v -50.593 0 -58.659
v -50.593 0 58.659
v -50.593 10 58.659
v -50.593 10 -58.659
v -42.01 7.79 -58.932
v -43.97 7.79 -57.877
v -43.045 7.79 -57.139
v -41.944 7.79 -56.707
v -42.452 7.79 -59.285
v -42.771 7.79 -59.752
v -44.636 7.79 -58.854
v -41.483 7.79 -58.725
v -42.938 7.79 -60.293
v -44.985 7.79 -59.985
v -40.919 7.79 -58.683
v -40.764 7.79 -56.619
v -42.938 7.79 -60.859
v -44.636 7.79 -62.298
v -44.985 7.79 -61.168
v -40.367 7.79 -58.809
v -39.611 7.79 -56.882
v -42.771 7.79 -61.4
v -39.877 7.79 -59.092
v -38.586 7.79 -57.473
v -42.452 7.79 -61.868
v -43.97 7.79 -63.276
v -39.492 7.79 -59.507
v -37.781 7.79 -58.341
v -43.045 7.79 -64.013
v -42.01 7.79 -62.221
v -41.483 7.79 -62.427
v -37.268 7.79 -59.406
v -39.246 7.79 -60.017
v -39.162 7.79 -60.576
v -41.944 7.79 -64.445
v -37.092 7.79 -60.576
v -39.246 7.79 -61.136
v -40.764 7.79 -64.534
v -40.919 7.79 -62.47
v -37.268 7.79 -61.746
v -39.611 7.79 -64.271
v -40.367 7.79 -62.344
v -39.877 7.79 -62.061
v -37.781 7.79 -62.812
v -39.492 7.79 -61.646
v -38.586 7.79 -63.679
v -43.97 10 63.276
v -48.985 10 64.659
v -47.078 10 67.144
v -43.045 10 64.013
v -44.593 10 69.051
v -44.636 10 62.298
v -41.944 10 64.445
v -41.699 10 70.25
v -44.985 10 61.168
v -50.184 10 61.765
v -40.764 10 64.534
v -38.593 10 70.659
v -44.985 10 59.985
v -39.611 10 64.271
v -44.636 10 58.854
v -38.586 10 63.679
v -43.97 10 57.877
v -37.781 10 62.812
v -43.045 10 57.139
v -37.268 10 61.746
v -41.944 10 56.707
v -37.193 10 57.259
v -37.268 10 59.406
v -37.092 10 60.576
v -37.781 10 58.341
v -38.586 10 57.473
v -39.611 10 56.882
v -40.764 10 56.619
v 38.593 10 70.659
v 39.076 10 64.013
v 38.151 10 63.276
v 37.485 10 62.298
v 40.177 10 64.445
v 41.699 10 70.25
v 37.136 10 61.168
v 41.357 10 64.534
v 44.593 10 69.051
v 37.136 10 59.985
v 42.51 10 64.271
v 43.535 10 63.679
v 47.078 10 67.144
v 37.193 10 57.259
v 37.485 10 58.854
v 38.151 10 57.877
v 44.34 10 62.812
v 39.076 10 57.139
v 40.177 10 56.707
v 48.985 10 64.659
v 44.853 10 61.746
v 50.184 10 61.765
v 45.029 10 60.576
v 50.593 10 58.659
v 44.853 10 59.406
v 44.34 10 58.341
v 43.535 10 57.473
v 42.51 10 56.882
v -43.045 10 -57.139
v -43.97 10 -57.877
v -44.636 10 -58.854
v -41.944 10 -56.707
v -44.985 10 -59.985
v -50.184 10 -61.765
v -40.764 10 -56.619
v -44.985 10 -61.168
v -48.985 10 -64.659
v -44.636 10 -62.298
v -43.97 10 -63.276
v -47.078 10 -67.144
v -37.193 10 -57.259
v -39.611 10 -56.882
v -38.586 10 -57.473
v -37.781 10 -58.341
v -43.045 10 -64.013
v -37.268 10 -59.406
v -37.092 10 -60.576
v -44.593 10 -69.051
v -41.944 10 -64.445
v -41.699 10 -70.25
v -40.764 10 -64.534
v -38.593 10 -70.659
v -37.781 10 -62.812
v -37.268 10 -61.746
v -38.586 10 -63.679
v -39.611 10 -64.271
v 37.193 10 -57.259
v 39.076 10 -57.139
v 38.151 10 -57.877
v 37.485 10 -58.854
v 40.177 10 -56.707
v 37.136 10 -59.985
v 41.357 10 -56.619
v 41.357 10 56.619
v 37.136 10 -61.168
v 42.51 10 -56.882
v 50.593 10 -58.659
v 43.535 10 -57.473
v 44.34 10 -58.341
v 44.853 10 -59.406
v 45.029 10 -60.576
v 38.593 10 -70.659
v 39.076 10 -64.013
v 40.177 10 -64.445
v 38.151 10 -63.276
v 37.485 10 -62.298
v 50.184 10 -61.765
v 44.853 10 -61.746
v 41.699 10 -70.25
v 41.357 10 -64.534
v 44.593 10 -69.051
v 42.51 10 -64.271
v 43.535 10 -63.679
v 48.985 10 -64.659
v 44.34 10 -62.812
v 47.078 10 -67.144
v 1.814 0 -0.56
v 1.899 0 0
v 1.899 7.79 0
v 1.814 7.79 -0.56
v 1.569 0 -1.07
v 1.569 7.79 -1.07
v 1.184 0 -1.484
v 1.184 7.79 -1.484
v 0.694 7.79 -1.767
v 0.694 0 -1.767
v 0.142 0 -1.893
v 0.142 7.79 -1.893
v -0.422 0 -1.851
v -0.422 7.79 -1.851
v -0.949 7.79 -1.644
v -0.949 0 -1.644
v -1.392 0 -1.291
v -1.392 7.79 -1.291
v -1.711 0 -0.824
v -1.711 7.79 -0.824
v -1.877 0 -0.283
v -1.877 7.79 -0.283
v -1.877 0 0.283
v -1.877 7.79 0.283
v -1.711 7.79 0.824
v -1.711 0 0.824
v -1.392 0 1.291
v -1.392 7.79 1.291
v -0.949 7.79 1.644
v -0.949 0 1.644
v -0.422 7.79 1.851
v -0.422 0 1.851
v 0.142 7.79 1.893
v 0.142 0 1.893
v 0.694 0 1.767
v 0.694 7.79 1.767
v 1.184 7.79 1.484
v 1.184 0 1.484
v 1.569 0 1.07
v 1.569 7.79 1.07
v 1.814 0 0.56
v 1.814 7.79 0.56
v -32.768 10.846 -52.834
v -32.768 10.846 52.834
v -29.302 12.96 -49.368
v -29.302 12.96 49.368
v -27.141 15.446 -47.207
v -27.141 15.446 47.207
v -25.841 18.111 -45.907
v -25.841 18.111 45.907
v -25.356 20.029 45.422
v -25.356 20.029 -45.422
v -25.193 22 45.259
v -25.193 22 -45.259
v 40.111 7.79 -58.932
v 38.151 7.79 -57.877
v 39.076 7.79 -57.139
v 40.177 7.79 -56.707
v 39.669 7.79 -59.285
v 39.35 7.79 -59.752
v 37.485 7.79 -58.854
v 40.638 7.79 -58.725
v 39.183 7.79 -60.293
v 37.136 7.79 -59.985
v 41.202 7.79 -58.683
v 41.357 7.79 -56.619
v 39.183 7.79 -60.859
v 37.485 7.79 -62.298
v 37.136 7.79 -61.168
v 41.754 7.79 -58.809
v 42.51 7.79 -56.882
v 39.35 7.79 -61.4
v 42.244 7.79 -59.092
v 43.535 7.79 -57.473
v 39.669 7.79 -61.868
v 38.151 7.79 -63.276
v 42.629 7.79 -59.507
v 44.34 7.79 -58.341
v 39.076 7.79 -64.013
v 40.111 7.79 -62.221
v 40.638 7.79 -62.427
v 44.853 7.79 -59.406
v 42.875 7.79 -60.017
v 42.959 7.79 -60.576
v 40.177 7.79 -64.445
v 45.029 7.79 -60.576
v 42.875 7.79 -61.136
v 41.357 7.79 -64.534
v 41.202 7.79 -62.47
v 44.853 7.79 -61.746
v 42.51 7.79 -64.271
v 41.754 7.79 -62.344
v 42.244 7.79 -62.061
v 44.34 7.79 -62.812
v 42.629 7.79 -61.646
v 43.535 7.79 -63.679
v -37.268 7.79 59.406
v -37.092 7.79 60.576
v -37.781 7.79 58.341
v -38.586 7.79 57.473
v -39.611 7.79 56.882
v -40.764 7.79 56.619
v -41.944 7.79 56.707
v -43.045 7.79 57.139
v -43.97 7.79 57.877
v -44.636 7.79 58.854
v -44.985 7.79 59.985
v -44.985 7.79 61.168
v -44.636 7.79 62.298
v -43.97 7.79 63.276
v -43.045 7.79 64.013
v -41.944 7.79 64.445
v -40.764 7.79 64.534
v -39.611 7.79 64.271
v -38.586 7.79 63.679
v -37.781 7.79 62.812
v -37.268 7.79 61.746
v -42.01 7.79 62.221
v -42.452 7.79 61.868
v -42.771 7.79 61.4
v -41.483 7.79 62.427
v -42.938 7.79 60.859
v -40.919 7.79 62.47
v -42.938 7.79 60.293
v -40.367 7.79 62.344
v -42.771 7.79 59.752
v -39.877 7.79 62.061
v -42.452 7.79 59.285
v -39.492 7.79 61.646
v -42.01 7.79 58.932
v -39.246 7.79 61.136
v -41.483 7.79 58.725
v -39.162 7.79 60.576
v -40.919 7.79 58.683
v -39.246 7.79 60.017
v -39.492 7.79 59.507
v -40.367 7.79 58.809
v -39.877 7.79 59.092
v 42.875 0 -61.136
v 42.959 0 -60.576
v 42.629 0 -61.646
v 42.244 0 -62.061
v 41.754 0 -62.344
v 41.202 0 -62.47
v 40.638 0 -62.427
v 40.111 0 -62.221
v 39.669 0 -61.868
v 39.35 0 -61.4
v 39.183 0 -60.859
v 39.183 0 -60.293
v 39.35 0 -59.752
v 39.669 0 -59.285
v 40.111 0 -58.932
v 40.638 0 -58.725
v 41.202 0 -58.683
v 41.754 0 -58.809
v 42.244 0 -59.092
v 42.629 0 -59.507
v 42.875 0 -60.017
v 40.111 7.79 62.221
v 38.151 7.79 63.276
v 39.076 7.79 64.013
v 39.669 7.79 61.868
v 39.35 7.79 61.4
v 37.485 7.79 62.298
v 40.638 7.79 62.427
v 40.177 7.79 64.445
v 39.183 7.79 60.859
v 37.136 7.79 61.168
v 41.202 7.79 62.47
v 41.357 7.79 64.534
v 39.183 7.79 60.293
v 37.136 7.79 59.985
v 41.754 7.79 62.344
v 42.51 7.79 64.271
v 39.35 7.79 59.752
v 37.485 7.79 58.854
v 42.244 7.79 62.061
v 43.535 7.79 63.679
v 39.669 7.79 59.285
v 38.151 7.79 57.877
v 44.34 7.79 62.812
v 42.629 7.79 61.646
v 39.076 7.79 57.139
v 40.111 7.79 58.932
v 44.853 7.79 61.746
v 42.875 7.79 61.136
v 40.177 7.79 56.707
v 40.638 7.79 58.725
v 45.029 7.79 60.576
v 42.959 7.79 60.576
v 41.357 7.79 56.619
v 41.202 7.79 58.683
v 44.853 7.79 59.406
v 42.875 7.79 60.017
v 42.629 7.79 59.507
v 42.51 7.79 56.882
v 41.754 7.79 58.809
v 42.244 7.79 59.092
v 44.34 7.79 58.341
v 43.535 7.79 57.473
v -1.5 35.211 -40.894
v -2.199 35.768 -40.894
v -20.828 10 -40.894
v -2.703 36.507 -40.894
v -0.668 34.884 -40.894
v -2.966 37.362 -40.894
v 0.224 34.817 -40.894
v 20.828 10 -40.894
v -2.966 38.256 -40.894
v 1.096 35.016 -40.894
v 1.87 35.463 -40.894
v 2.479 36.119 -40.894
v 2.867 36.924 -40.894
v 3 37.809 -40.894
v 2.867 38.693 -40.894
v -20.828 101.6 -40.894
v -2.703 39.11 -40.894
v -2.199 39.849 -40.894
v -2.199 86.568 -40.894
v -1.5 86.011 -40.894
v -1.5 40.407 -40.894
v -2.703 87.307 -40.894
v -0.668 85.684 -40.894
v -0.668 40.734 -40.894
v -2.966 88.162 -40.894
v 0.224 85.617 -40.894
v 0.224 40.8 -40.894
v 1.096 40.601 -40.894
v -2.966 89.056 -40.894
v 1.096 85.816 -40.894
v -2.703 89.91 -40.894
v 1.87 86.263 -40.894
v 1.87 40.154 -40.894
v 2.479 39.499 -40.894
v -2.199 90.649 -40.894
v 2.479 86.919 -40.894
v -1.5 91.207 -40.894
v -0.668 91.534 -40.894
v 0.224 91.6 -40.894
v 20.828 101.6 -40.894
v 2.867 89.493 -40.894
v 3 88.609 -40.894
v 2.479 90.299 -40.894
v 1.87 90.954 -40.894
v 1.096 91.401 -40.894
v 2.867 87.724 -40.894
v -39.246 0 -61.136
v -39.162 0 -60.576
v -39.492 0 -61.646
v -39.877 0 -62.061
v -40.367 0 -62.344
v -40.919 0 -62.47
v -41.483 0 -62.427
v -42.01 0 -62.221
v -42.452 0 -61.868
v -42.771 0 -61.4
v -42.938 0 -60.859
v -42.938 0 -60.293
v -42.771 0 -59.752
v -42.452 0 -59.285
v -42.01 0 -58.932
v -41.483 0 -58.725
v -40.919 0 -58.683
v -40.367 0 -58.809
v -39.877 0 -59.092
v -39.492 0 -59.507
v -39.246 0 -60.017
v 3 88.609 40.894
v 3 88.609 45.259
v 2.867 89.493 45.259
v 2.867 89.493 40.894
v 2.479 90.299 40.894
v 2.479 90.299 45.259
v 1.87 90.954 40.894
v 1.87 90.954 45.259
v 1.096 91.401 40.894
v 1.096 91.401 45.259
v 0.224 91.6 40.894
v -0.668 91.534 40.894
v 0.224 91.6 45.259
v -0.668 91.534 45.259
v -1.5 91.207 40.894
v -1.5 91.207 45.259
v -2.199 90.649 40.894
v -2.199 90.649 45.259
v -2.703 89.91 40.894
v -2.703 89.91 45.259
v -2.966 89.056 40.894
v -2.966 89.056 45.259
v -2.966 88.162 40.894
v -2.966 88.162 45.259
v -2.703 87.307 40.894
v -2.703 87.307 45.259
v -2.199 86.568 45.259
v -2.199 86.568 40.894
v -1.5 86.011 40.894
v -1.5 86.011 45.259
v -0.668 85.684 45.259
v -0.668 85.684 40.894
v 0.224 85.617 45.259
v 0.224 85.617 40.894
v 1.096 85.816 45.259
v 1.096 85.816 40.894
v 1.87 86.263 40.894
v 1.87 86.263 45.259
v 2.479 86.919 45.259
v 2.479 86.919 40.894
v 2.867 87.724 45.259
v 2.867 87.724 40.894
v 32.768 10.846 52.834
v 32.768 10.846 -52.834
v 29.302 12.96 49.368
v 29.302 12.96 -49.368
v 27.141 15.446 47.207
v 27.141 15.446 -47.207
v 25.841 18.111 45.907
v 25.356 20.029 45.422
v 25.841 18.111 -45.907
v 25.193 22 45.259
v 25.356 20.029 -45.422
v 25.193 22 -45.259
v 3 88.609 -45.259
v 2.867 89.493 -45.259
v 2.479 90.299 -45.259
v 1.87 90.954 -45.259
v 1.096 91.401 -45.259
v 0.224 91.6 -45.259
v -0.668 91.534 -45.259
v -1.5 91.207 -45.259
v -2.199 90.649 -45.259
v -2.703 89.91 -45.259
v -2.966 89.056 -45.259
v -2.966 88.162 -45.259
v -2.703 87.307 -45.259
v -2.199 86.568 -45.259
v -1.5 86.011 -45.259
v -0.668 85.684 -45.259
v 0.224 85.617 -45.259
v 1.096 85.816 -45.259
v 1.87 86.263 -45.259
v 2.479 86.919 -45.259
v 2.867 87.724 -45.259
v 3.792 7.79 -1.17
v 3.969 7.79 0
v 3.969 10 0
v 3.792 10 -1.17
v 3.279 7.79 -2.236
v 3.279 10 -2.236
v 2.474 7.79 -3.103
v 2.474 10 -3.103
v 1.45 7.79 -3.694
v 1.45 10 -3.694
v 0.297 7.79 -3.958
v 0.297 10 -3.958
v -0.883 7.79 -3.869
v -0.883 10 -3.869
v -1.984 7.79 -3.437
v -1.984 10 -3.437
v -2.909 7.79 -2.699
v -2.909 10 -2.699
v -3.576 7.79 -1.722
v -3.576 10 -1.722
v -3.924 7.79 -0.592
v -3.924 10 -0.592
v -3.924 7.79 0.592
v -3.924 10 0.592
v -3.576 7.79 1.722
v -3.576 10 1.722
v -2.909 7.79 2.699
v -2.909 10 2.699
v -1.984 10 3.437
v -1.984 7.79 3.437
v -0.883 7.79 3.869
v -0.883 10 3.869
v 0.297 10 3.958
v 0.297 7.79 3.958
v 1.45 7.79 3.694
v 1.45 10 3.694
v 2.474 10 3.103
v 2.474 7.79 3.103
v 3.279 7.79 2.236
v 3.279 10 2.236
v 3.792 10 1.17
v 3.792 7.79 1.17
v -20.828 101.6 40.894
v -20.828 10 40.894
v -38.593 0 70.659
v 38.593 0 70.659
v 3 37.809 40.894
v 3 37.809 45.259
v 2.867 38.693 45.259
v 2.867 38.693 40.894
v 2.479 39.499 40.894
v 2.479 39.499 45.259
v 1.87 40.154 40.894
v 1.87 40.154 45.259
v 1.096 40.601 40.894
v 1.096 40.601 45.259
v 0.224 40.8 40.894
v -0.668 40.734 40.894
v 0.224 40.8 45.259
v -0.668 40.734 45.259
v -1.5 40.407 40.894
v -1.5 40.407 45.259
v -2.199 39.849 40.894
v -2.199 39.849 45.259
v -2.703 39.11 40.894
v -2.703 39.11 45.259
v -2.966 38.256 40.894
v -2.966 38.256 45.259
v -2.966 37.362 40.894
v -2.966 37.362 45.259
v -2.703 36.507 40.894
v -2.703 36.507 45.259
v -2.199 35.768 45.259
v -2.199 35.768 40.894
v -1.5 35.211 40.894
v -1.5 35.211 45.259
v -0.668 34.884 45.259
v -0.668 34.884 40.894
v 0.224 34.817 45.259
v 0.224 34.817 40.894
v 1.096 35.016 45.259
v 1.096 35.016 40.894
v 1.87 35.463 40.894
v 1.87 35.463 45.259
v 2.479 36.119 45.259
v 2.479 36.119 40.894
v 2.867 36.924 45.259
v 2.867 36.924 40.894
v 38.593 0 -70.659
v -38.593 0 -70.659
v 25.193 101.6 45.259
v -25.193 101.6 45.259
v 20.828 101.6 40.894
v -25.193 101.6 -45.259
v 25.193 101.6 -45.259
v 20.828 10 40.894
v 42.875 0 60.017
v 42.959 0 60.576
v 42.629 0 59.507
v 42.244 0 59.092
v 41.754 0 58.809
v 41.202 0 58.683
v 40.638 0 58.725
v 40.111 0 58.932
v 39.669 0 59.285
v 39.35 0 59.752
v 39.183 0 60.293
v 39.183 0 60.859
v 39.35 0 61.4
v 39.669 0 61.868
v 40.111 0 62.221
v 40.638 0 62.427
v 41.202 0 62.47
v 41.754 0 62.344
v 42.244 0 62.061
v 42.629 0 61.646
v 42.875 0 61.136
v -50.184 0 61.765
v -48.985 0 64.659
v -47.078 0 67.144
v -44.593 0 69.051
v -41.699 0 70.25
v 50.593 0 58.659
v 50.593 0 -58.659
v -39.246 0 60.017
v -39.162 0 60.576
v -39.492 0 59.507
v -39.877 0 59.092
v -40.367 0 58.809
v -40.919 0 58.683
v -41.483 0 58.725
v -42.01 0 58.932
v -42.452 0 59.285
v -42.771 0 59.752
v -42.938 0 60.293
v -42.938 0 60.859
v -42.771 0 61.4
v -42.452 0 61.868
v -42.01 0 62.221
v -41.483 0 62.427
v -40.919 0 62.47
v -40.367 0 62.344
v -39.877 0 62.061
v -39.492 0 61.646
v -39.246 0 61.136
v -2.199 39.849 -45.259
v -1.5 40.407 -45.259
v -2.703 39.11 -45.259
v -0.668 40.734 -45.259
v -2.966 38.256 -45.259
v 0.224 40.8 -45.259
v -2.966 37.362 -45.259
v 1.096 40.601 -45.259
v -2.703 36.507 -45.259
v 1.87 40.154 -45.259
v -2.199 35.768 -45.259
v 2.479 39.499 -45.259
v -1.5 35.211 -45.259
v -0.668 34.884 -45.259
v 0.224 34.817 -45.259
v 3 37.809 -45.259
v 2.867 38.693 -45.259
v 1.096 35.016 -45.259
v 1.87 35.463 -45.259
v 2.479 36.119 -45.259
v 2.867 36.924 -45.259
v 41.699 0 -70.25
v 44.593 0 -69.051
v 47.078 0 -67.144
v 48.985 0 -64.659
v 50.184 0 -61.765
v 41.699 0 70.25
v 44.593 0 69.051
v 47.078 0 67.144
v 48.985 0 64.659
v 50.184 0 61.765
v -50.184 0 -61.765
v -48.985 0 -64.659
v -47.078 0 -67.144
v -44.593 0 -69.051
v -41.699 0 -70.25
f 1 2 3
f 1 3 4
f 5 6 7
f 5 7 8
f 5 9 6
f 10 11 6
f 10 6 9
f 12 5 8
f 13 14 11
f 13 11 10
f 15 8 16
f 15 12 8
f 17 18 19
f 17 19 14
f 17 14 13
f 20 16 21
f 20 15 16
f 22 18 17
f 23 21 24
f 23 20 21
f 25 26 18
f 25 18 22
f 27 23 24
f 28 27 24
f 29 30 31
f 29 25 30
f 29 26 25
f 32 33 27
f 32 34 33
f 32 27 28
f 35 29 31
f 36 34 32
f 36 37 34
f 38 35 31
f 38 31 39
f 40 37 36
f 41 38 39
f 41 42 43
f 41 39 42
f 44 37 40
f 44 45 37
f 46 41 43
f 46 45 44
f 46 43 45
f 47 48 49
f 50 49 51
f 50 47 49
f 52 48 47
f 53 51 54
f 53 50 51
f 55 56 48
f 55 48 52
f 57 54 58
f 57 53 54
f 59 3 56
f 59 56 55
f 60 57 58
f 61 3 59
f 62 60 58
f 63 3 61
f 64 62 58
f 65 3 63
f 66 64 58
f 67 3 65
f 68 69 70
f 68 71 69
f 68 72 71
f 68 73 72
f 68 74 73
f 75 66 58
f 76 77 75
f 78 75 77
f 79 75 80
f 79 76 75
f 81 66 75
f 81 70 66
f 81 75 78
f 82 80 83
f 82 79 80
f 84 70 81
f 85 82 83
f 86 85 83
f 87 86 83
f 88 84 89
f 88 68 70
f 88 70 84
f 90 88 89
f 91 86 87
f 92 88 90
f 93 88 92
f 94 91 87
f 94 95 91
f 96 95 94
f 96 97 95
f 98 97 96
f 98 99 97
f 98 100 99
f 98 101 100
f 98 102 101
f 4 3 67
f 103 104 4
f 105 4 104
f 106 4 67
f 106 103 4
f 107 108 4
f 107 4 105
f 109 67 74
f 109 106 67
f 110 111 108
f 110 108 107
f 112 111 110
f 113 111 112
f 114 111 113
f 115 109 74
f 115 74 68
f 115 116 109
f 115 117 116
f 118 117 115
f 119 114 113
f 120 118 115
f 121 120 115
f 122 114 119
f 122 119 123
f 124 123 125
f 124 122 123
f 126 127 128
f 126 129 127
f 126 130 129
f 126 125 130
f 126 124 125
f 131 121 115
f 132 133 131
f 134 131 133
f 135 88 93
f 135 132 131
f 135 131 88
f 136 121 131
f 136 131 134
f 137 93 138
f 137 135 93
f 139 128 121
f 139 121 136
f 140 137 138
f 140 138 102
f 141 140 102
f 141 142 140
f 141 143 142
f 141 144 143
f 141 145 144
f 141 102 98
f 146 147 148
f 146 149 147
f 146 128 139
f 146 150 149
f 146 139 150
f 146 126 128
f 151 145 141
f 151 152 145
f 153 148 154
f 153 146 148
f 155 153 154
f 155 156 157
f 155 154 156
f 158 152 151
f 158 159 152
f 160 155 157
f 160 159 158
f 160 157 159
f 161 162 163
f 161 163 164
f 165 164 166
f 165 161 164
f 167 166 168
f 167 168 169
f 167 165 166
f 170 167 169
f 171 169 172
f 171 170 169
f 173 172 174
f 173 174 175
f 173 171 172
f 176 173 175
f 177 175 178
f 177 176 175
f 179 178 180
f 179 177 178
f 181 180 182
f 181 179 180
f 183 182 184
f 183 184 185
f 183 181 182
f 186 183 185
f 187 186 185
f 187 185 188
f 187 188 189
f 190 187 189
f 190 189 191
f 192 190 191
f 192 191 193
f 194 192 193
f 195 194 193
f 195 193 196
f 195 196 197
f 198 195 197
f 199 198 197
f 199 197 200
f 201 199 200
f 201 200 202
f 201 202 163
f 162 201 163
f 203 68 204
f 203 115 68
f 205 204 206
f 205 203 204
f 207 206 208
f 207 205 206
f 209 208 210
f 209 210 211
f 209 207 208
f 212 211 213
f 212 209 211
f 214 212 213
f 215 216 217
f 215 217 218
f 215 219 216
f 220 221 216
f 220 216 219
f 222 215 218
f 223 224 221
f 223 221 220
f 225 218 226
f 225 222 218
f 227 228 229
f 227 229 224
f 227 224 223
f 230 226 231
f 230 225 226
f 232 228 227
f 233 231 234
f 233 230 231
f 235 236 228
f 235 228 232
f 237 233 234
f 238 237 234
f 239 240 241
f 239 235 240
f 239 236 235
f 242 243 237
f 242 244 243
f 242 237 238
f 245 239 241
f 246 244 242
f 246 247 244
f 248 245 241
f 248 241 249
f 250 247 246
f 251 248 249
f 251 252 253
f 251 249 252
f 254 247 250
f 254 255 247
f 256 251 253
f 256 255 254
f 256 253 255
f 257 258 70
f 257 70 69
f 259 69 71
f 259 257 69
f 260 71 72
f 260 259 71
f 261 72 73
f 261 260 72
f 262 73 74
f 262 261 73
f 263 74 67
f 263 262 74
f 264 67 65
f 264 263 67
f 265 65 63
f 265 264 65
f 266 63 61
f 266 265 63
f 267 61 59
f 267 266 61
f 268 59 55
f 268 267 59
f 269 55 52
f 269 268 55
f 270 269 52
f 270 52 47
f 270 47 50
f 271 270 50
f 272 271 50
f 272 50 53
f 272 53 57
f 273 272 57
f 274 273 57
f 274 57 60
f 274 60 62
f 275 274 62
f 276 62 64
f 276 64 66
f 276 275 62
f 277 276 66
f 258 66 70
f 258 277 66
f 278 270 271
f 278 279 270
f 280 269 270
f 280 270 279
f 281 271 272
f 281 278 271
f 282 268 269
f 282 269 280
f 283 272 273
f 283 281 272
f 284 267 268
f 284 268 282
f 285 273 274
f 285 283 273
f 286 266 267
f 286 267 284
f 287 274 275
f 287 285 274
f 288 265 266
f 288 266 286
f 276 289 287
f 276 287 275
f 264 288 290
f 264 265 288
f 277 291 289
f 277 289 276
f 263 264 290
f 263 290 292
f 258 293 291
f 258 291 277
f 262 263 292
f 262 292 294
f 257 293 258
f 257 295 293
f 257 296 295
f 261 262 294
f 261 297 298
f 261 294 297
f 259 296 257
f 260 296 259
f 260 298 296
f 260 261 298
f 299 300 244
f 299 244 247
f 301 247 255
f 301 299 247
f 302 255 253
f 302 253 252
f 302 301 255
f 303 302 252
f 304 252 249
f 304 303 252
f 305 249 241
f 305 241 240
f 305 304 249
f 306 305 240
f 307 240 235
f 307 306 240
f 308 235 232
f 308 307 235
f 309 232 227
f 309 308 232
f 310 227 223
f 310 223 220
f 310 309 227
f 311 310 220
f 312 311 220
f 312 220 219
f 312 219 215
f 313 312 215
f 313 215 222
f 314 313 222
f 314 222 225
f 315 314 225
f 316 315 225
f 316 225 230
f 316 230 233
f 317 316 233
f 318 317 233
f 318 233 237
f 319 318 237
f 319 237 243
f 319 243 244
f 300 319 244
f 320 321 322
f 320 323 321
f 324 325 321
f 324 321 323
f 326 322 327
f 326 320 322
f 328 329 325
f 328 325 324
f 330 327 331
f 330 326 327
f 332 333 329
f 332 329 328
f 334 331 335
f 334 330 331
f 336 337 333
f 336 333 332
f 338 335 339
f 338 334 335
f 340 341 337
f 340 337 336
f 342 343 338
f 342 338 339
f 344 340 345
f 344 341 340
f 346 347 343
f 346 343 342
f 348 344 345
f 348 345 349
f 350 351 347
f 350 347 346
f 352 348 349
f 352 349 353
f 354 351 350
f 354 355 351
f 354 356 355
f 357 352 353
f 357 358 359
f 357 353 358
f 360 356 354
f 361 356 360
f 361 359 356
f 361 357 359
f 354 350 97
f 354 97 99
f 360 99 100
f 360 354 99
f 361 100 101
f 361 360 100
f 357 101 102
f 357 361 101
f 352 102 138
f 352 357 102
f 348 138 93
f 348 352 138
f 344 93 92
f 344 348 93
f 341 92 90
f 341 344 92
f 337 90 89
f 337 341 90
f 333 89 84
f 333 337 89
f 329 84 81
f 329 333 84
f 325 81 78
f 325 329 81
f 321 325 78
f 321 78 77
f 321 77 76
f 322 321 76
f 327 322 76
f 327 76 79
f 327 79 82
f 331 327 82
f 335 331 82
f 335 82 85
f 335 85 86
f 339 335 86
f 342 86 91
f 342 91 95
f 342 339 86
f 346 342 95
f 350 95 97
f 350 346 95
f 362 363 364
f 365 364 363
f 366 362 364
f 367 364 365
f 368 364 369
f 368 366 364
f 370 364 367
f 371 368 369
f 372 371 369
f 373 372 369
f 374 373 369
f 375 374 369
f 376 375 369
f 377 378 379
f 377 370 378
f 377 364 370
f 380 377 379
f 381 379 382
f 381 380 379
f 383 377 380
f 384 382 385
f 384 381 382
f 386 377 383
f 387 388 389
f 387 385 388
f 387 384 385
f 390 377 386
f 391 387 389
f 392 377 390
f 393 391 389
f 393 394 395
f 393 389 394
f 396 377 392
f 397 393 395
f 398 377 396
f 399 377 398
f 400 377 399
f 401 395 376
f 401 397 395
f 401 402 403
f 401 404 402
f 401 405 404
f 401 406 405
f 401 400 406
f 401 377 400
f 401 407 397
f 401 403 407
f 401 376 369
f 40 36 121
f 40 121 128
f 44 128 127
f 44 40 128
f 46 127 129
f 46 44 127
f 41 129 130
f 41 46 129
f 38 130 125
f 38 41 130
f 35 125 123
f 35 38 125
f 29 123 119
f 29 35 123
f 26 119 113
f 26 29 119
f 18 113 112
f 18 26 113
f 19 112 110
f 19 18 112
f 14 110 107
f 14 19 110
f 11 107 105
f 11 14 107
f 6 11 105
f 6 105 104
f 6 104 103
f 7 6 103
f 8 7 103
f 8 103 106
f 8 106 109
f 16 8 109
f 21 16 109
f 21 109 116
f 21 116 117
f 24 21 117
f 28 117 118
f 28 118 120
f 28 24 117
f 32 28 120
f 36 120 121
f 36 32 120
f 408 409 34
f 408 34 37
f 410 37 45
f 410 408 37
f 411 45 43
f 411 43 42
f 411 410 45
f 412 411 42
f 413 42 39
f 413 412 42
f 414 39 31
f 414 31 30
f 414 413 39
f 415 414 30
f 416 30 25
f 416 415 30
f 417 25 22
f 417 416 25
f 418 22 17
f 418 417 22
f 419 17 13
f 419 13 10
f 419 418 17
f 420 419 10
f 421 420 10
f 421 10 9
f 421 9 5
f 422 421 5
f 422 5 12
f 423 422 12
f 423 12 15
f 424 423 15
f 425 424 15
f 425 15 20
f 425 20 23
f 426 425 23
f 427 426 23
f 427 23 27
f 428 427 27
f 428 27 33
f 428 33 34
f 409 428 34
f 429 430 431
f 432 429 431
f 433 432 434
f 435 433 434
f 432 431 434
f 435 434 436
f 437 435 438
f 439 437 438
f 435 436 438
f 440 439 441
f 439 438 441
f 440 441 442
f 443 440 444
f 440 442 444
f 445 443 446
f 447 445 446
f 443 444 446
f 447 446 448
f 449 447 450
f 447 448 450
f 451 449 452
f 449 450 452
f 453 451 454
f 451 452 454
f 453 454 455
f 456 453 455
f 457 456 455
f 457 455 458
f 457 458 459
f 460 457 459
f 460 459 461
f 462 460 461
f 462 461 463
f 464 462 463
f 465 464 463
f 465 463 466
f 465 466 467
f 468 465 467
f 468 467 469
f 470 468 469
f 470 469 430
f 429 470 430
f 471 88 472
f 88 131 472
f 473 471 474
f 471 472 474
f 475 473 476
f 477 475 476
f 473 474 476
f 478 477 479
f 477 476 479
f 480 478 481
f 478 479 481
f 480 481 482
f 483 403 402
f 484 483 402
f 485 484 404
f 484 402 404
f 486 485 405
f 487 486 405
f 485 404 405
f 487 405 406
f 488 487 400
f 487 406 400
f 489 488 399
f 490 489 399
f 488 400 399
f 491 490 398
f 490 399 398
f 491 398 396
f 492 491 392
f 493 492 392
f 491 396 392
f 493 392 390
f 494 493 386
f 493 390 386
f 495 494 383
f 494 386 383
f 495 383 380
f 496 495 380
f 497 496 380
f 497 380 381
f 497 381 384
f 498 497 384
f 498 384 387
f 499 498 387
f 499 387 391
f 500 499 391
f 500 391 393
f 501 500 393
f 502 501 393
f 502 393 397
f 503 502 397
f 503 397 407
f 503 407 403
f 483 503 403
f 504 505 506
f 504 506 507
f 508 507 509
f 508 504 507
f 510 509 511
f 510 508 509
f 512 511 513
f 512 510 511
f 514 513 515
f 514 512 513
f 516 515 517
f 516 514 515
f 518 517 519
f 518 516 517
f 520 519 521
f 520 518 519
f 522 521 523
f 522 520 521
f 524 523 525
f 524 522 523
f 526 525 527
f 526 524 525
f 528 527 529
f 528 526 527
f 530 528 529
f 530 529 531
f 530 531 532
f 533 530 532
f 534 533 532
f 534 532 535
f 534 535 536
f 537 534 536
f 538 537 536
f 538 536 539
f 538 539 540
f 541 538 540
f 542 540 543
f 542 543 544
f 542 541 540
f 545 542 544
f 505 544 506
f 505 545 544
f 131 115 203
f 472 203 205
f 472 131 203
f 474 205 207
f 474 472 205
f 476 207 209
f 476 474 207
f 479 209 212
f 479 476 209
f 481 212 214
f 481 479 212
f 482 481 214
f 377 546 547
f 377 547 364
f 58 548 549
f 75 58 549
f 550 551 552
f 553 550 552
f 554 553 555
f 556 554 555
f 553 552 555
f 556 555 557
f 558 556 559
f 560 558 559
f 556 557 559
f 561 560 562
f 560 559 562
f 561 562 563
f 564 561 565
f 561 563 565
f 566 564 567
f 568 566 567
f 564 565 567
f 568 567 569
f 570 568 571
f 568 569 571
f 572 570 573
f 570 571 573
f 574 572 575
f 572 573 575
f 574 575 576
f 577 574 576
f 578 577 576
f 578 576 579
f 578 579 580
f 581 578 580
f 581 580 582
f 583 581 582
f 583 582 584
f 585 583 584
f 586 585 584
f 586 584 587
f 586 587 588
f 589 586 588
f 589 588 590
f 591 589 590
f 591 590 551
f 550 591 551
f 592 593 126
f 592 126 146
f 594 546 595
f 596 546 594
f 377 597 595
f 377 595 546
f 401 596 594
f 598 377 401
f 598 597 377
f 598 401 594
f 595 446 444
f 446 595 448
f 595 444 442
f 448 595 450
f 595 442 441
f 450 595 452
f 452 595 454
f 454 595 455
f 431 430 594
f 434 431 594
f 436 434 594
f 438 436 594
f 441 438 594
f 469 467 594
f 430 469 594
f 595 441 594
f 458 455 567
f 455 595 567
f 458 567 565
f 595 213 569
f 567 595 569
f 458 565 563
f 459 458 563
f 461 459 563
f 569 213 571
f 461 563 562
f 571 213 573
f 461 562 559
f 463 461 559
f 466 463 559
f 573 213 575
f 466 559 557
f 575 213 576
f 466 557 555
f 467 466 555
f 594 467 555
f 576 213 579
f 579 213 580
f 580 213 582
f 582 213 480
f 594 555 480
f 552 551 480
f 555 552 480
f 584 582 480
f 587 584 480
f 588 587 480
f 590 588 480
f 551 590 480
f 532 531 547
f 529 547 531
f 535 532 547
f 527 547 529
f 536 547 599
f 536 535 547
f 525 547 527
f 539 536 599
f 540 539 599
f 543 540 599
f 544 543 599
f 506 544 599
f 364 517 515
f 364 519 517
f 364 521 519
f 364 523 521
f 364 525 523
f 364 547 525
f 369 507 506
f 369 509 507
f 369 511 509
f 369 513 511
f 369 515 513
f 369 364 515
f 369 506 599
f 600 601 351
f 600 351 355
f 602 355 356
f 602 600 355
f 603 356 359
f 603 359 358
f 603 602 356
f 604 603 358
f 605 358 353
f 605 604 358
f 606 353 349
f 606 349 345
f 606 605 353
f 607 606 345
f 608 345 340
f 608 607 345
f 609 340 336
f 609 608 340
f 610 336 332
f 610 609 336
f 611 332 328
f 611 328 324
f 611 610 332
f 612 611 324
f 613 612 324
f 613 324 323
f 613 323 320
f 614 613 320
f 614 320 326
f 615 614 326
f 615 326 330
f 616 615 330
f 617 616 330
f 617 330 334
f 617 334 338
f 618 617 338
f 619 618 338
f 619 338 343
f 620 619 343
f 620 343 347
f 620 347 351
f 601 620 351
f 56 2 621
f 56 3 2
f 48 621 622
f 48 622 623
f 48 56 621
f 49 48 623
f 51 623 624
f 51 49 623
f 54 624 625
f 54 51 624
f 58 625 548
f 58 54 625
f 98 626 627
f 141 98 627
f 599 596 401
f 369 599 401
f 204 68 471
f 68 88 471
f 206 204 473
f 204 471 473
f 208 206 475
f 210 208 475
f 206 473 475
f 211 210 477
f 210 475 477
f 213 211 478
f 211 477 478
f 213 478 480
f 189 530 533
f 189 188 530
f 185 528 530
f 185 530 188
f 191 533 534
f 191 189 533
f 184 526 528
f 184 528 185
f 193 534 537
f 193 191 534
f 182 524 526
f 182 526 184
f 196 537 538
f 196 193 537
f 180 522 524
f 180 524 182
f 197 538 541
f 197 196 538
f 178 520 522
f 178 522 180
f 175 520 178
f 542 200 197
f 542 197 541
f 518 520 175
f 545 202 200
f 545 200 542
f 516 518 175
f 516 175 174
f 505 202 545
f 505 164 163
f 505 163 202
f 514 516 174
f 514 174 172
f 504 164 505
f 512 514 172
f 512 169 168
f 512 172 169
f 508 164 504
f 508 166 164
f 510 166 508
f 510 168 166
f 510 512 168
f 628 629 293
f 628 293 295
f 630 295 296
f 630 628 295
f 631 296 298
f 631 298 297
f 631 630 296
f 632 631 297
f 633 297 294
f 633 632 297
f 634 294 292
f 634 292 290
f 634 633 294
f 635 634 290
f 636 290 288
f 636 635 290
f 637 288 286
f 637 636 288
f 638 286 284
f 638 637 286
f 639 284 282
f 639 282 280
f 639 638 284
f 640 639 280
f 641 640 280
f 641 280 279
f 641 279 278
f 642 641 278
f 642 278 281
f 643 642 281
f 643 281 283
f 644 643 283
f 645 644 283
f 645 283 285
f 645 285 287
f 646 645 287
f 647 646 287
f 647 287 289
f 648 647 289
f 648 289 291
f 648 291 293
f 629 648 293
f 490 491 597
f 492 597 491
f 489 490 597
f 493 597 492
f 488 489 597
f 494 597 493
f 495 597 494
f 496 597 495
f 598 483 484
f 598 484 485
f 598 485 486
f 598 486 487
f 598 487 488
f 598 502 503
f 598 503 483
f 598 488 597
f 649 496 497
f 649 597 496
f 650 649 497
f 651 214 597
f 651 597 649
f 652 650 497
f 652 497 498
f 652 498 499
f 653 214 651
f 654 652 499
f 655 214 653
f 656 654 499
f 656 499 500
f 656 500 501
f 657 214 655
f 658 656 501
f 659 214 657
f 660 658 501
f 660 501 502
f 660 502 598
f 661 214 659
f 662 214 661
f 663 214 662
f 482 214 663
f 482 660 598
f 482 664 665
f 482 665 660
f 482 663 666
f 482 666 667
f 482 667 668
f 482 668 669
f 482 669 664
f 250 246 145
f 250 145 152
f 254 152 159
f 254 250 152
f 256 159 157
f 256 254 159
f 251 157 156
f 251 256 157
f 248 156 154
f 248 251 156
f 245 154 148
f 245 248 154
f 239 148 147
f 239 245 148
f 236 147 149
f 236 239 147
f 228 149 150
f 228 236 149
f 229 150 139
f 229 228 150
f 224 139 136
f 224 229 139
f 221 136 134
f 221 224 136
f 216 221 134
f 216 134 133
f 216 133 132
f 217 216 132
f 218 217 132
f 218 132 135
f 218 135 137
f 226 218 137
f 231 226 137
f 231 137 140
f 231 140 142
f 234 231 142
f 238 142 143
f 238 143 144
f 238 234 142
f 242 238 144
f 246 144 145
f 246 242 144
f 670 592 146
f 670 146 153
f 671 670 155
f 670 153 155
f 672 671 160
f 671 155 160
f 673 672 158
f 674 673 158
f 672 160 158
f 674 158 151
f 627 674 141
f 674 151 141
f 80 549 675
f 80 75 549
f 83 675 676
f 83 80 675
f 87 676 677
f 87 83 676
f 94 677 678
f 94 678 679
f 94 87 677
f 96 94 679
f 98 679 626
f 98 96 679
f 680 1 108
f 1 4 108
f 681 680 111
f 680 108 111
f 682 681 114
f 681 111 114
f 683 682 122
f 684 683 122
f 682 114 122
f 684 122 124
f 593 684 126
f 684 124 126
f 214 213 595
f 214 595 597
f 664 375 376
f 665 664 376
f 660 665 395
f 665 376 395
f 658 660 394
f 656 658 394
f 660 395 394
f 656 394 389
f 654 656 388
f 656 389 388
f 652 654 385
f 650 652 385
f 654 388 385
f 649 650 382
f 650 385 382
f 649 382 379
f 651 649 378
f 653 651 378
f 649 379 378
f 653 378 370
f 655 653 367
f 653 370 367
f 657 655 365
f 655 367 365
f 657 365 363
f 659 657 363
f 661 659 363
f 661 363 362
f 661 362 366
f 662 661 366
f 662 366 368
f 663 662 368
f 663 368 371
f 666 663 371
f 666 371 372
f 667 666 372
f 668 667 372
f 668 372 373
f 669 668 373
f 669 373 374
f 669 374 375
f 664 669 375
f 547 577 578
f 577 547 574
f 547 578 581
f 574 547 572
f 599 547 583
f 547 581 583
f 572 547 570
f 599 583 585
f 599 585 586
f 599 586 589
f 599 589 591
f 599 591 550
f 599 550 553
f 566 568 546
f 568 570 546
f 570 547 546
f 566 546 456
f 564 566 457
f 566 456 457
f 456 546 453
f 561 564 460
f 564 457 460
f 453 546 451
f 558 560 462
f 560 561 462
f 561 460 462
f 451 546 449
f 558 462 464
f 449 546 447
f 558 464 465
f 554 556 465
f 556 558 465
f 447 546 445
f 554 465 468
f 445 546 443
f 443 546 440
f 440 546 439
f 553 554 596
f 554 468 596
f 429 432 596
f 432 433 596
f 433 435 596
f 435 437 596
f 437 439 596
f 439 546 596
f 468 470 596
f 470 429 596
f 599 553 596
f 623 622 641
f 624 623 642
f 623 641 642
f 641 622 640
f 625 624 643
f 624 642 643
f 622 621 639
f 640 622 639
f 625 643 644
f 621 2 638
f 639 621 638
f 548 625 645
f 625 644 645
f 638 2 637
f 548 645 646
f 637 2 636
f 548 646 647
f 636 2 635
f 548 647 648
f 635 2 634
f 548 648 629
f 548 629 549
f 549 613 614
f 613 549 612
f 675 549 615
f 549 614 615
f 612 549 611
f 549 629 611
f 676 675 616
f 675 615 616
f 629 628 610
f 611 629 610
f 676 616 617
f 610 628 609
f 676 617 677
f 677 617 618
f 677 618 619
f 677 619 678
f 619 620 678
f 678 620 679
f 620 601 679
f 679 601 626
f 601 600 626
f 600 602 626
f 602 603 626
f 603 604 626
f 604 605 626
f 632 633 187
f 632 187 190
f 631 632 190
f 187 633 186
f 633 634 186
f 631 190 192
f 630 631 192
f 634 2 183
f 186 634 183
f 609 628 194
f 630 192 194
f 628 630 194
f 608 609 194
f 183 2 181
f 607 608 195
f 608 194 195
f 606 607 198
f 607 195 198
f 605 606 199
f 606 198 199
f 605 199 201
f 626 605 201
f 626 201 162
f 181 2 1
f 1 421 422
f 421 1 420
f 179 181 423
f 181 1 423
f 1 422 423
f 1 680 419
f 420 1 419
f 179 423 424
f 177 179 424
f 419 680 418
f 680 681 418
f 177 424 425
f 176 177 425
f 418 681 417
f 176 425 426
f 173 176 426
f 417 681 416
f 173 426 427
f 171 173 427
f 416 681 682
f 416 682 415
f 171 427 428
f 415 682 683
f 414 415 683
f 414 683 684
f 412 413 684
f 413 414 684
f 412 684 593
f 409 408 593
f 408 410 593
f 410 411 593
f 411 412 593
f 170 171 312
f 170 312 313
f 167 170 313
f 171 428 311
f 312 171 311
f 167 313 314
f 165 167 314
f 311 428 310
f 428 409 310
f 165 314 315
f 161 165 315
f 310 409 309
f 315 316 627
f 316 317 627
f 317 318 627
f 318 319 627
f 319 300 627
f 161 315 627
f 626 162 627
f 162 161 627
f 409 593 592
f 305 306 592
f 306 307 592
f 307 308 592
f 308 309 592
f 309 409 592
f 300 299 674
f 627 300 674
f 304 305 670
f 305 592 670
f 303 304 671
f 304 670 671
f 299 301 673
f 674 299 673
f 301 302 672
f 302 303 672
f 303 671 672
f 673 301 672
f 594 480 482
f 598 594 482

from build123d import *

# Parameters (mm, degrees)
SKETCH1_W                                     = 50.386
SKETCH1_H                                     = 90.518
SKETCH1_W_2                                   = 40.386
SKETCH1_H_2                                   = 80.518
BOSS_EXTRUDE1_DEPTH                           = 101.6
SKETCH2_W                                     = 101.186
SKETCH2_H                                     = 141.318
BOSS_EXTRUDE2_DEPTH                           = 10
FILLET1_R                                     = 12
CBORE_FOR_6_BINDING_HEAD_MACHINE_SC_2_R       = 1.89865
CBORE_FOR_6_BINDING_HEAD_MACHINE_SCREW2_DEPTH = 10
CBORE_START                                   = 7.7902
CBORE_FOR_6_BINDING_HEAD_MACHINE_SC_3_O_R     = 3.96875
CBORE_FOR_6_BINDING_HEAD_MACHINE_SC_3_O_R_2   = 1.89865
CBORE_FOR_6_BINDING_HEAD_MACHINE_SC_3_DEPTH   = 2.2098
FILLET2_R                                     = 12
SKETCH9_R                                     = 3
CUT_EXTRUDE1_DEPTH                            = 163.231915396
CUT_EXTRUDE2_REACH                            = 135.697
SKETCH10_W                                    = 41.656
SKETCH10_H                                    = 81.788
SKETCH10_W_2                                  = 40.386
SKETCH10_H_2                                  = 80.518
CUT_EXTRUDE2_DIRECTION_2_DEPTH                = 134.697067769


# Read off the part's stored shape, not the designer's step: CBORE for #6 Binding Head Machine Screw2
with BuildPart() as part:
    # Sketch1 → Boss-Extrude1 (new body)
    with BuildSketch(Plane(origin=(0, 0, 0), x_dir=(1, 0, 0), z_dir=(0, 1, 0))):
        Rectangle(SKETCH1_W, SKETCH1_H)
        Rectangle(SKETCH1_W_2, SKETCH1_H_2, mode=Mode.SUBTRACT)
    extrude(amount=BOSS_EXTRUDE1_DEPTH)

    # Sketch2 → Boss-Extrude2 (add)
    with BuildSketch(Plane(origin=(0, 0, 0), x_dir=(1, 0, 0), z_dir=(0, 1, 0))):
        Rectangle(SKETCH2_W, SKETCH2_H)
    extrude(amount=BOSS_EXTRUDE2_DEPTH)

    # Fillet1
    fillet1_edges = [part.edges().sort_by_distance(p)[0] for p in [
        (0, 10, -45.259),
        (25.193, 10, 0),
        (0, 10, 45.259),
        (-25.193, 10, 0),
    ]]
    fillet(fillet1_edges, radius=FILLET1_R)

    # CBORE for _6 Binding Head Machine Sc 2 → CBORE for #6 Binding Head Machine Screw2 (cut)
    with BuildSketch(Plane(origin=(0, 0, 0), x_dir=(1, 0, 0), z_dir=(0, 1, 0))):
        with Locations((41.060456563, -60.576250035)):
            Circle(CBORE_FOR_6_BINDING_HEAD_MACHINE_SC_2_R)
        with Locations((-41.060456563, 60.576250035)):
            Circle(CBORE_FOR_6_BINDING_HEAD_MACHINE_SC_2_R)
        with Locations((-41.060456563, -60.576250035)):
            Circle(CBORE_FOR_6_BINDING_HEAD_MACHINE_SC_2_R)
        with Locations((41.060456563, 60.576250035)):
            Circle(CBORE_FOR_6_BINDING_HEAD_MACHINE_SC_2_R)
        Circle(CBORE_FOR_6_BINDING_HEAD_MACHINE_SC_2_R)
    extrude(amount=CBORE_FOR_6_BINDING_HEAD_MACHINE_SCREW2_DEPTH, mode=Mode.SUBTRACT)

    # CBORE for _6 Binding Head Machine Sc 3 o → CBORE for _6 Binding Head Machine Sc 3 (cut)
    # profile 1 of 5: a face of its own
    with BuildSketch(Plane(origin=(0, 0, 0), x_dir=(1, 0, 0), z_dir=(0, 1, 0)).offset(CBORE_START)):
        with Locations((41.060456563, -60.576250035)):
            Circle(CBORE_FOR_6_BINDING_HEAD_MACHINE_SC_3_O_R)
        with Locations((41.060456563, -60.576250035)):
            Circle(CBORE_FOR_6_BINDING_HEAD_MACHINE_SC_3_O_R_2, mode=Mode.SUBTRACT)
    # profile 2 of 5: a face of its own
    with BuildSketch(Plane(origin=(0, 0, 0), x_dir=(1, 0, 0), z_dir=(0, 1, 0)).offset(CBORE_START)):
        with Locations((-41.060456563, 60.576250035)):
            Circle(CBORE_FOR_6_BINDING_HEAD_MACHINE_SC_3_O_R)
        with Locations((-41.060456563, 60.576250035)):
            Circle(CBORE_FOR_6_BINDING_HEAD_MACHINE_SC_3_O_R_2, mode=Mode.SUBTRACT)
    # profile 3 of 5: a face of its own
    with BuildSketch(Plane(origin=(0, 0, 0), x_dir=(1, 0, 0), z_dir=(0, 1, 0)).offset(CBORE_START)):
        with Locations((-41.060456563, -60.576250035)):
            Circle(CBORE_FOR_6_BINDING_HEAD_MACHINE_SC_3_O_R)
        with Locations((-41.060456563, -60.576250035)):
            Circle(CBORE_FOR_6_BINDING_HEAD_MACHINE_SC_3_O_R_2, mode=Mode.SUBTRACT)
    # profile 4 of 5: a face of its own
    with BuildSketch(Plane(origin=(0, 0, 0), x_dir=(1, 0, 0), z_dir=(0, 1, 0)).offset(CBORE_START)):
        with Locations((41.060456563, 60.576250035)):
            Circle(CBORE_FOR_6_BINDING_HEAD_MACHINE_SC_3_O_R)
        with Locations((41.060456563, 60.576250035)):
            Circle(CBORE_FOR_6_BINDING_HEAD_MACHINE_SC_3_O_R_2, mode=Mode.SUBTRACT)
    # profile 5 of 5: a face of its own
    with BuildSketch(Plane(origin=(0, 0, 0), x_dir=(1, 0, 0), z_dir=(0, 1, 0)).offset(CBORE_START)):
        Circle(CBORE_FOR_6_BINDING_HEAD_MACHINE_SC_3_O_R)
        Circle(CBORE_FOR_6_BINDING_HEAD_MACHINE_SC_3_O_R_2, mode=Mode.SUBTRACT)
    extrude(amount=CBORE_FOR_6_BINDING_HEAD_MACHINE_SC_3_DEPTH, mode=Mode.SUBTRACT)

    # Fillet2
    fillet2_edges = [part.edges().sort_by_distance(p)[0] for p in [
        (50.593, 5, 70.659),
        (50.593, 5, -70.659),
        (-50.593, 5, -70.659),
        (-50.593, 5, 70.659),
    ]]
    fillet(fillet2_edges, radius=FILLET2_R)

    # Sketch9 → Cut-Extrude1 (cut, through all)
    with BuildSketch(Plane.XY.offset(45.259)):
        with Locations((0, 88.608727906)):
            Circle(SKETCH9_R)
        with Locations((0, 37.808727906)):
            Circle(SKETCH9_R)
    extrude(amount=-CUT_EXTRUDE1_DEPTH, mode=Mode.SUBTRACT)

    # Cut-Extrude2: up to this face of the body (flat: up to its plane)
    cut_extrude2_end = Plane(part.part.faces().sort_by_distance((0, 10, -39.358212715))[0])
    # Sketch10 → Cut-Extrude2 (cut, up to the picked face)
    with BuildSketch(Plane(origin=(0, 101.6, 0), x_dir=(1, 0, 0), z_dir=(0, 1, 0)), mode=Mode.PRIVATE) as cut_extrude2_sk1:
        Rectangle(SKETCH10_W, SKETCH10_H)
        Rectangle(SKETCH10_W_2, SKETCH10_H_2, mode=Mode.SUBTRACT)
    cut_extrude2_tool1 = split(extrude(cut_extrude2_sk1.sketch, amount=-CUT_EXTRUDE2_REACH, mode=Mode.PRIVATE), bisect_by=cut_extrude2_end, keep=Keep.BOTH, mode=Mode.PRIVATE)
    add(cut_extrude2_tool1.solids().sort_by(Axis((20.736215, 101.6, 0), (0, -1, 0)))[0], mode=Mode.SUBTRACT)

    # Sketch10 → Cut-Extrude2 direction 2 (cut)
    with BuildSketch(Plane(origin=(0, 101.6, 0), x_dir=(1, 0, 0), z_dir=(0, 1, 0))):
        Rectangle(SKETCH10_W, SKETCH10_H)
        Rectangle(SKETCH10_W_2, SKETCH10_H_2, mode=Mode.SUBTRACT)
    extrude(amount=CUT_EXTRUDE2_DIRECTION_2_DEPTH, mode=Mode.SUBTRACT)


solid = part.part
